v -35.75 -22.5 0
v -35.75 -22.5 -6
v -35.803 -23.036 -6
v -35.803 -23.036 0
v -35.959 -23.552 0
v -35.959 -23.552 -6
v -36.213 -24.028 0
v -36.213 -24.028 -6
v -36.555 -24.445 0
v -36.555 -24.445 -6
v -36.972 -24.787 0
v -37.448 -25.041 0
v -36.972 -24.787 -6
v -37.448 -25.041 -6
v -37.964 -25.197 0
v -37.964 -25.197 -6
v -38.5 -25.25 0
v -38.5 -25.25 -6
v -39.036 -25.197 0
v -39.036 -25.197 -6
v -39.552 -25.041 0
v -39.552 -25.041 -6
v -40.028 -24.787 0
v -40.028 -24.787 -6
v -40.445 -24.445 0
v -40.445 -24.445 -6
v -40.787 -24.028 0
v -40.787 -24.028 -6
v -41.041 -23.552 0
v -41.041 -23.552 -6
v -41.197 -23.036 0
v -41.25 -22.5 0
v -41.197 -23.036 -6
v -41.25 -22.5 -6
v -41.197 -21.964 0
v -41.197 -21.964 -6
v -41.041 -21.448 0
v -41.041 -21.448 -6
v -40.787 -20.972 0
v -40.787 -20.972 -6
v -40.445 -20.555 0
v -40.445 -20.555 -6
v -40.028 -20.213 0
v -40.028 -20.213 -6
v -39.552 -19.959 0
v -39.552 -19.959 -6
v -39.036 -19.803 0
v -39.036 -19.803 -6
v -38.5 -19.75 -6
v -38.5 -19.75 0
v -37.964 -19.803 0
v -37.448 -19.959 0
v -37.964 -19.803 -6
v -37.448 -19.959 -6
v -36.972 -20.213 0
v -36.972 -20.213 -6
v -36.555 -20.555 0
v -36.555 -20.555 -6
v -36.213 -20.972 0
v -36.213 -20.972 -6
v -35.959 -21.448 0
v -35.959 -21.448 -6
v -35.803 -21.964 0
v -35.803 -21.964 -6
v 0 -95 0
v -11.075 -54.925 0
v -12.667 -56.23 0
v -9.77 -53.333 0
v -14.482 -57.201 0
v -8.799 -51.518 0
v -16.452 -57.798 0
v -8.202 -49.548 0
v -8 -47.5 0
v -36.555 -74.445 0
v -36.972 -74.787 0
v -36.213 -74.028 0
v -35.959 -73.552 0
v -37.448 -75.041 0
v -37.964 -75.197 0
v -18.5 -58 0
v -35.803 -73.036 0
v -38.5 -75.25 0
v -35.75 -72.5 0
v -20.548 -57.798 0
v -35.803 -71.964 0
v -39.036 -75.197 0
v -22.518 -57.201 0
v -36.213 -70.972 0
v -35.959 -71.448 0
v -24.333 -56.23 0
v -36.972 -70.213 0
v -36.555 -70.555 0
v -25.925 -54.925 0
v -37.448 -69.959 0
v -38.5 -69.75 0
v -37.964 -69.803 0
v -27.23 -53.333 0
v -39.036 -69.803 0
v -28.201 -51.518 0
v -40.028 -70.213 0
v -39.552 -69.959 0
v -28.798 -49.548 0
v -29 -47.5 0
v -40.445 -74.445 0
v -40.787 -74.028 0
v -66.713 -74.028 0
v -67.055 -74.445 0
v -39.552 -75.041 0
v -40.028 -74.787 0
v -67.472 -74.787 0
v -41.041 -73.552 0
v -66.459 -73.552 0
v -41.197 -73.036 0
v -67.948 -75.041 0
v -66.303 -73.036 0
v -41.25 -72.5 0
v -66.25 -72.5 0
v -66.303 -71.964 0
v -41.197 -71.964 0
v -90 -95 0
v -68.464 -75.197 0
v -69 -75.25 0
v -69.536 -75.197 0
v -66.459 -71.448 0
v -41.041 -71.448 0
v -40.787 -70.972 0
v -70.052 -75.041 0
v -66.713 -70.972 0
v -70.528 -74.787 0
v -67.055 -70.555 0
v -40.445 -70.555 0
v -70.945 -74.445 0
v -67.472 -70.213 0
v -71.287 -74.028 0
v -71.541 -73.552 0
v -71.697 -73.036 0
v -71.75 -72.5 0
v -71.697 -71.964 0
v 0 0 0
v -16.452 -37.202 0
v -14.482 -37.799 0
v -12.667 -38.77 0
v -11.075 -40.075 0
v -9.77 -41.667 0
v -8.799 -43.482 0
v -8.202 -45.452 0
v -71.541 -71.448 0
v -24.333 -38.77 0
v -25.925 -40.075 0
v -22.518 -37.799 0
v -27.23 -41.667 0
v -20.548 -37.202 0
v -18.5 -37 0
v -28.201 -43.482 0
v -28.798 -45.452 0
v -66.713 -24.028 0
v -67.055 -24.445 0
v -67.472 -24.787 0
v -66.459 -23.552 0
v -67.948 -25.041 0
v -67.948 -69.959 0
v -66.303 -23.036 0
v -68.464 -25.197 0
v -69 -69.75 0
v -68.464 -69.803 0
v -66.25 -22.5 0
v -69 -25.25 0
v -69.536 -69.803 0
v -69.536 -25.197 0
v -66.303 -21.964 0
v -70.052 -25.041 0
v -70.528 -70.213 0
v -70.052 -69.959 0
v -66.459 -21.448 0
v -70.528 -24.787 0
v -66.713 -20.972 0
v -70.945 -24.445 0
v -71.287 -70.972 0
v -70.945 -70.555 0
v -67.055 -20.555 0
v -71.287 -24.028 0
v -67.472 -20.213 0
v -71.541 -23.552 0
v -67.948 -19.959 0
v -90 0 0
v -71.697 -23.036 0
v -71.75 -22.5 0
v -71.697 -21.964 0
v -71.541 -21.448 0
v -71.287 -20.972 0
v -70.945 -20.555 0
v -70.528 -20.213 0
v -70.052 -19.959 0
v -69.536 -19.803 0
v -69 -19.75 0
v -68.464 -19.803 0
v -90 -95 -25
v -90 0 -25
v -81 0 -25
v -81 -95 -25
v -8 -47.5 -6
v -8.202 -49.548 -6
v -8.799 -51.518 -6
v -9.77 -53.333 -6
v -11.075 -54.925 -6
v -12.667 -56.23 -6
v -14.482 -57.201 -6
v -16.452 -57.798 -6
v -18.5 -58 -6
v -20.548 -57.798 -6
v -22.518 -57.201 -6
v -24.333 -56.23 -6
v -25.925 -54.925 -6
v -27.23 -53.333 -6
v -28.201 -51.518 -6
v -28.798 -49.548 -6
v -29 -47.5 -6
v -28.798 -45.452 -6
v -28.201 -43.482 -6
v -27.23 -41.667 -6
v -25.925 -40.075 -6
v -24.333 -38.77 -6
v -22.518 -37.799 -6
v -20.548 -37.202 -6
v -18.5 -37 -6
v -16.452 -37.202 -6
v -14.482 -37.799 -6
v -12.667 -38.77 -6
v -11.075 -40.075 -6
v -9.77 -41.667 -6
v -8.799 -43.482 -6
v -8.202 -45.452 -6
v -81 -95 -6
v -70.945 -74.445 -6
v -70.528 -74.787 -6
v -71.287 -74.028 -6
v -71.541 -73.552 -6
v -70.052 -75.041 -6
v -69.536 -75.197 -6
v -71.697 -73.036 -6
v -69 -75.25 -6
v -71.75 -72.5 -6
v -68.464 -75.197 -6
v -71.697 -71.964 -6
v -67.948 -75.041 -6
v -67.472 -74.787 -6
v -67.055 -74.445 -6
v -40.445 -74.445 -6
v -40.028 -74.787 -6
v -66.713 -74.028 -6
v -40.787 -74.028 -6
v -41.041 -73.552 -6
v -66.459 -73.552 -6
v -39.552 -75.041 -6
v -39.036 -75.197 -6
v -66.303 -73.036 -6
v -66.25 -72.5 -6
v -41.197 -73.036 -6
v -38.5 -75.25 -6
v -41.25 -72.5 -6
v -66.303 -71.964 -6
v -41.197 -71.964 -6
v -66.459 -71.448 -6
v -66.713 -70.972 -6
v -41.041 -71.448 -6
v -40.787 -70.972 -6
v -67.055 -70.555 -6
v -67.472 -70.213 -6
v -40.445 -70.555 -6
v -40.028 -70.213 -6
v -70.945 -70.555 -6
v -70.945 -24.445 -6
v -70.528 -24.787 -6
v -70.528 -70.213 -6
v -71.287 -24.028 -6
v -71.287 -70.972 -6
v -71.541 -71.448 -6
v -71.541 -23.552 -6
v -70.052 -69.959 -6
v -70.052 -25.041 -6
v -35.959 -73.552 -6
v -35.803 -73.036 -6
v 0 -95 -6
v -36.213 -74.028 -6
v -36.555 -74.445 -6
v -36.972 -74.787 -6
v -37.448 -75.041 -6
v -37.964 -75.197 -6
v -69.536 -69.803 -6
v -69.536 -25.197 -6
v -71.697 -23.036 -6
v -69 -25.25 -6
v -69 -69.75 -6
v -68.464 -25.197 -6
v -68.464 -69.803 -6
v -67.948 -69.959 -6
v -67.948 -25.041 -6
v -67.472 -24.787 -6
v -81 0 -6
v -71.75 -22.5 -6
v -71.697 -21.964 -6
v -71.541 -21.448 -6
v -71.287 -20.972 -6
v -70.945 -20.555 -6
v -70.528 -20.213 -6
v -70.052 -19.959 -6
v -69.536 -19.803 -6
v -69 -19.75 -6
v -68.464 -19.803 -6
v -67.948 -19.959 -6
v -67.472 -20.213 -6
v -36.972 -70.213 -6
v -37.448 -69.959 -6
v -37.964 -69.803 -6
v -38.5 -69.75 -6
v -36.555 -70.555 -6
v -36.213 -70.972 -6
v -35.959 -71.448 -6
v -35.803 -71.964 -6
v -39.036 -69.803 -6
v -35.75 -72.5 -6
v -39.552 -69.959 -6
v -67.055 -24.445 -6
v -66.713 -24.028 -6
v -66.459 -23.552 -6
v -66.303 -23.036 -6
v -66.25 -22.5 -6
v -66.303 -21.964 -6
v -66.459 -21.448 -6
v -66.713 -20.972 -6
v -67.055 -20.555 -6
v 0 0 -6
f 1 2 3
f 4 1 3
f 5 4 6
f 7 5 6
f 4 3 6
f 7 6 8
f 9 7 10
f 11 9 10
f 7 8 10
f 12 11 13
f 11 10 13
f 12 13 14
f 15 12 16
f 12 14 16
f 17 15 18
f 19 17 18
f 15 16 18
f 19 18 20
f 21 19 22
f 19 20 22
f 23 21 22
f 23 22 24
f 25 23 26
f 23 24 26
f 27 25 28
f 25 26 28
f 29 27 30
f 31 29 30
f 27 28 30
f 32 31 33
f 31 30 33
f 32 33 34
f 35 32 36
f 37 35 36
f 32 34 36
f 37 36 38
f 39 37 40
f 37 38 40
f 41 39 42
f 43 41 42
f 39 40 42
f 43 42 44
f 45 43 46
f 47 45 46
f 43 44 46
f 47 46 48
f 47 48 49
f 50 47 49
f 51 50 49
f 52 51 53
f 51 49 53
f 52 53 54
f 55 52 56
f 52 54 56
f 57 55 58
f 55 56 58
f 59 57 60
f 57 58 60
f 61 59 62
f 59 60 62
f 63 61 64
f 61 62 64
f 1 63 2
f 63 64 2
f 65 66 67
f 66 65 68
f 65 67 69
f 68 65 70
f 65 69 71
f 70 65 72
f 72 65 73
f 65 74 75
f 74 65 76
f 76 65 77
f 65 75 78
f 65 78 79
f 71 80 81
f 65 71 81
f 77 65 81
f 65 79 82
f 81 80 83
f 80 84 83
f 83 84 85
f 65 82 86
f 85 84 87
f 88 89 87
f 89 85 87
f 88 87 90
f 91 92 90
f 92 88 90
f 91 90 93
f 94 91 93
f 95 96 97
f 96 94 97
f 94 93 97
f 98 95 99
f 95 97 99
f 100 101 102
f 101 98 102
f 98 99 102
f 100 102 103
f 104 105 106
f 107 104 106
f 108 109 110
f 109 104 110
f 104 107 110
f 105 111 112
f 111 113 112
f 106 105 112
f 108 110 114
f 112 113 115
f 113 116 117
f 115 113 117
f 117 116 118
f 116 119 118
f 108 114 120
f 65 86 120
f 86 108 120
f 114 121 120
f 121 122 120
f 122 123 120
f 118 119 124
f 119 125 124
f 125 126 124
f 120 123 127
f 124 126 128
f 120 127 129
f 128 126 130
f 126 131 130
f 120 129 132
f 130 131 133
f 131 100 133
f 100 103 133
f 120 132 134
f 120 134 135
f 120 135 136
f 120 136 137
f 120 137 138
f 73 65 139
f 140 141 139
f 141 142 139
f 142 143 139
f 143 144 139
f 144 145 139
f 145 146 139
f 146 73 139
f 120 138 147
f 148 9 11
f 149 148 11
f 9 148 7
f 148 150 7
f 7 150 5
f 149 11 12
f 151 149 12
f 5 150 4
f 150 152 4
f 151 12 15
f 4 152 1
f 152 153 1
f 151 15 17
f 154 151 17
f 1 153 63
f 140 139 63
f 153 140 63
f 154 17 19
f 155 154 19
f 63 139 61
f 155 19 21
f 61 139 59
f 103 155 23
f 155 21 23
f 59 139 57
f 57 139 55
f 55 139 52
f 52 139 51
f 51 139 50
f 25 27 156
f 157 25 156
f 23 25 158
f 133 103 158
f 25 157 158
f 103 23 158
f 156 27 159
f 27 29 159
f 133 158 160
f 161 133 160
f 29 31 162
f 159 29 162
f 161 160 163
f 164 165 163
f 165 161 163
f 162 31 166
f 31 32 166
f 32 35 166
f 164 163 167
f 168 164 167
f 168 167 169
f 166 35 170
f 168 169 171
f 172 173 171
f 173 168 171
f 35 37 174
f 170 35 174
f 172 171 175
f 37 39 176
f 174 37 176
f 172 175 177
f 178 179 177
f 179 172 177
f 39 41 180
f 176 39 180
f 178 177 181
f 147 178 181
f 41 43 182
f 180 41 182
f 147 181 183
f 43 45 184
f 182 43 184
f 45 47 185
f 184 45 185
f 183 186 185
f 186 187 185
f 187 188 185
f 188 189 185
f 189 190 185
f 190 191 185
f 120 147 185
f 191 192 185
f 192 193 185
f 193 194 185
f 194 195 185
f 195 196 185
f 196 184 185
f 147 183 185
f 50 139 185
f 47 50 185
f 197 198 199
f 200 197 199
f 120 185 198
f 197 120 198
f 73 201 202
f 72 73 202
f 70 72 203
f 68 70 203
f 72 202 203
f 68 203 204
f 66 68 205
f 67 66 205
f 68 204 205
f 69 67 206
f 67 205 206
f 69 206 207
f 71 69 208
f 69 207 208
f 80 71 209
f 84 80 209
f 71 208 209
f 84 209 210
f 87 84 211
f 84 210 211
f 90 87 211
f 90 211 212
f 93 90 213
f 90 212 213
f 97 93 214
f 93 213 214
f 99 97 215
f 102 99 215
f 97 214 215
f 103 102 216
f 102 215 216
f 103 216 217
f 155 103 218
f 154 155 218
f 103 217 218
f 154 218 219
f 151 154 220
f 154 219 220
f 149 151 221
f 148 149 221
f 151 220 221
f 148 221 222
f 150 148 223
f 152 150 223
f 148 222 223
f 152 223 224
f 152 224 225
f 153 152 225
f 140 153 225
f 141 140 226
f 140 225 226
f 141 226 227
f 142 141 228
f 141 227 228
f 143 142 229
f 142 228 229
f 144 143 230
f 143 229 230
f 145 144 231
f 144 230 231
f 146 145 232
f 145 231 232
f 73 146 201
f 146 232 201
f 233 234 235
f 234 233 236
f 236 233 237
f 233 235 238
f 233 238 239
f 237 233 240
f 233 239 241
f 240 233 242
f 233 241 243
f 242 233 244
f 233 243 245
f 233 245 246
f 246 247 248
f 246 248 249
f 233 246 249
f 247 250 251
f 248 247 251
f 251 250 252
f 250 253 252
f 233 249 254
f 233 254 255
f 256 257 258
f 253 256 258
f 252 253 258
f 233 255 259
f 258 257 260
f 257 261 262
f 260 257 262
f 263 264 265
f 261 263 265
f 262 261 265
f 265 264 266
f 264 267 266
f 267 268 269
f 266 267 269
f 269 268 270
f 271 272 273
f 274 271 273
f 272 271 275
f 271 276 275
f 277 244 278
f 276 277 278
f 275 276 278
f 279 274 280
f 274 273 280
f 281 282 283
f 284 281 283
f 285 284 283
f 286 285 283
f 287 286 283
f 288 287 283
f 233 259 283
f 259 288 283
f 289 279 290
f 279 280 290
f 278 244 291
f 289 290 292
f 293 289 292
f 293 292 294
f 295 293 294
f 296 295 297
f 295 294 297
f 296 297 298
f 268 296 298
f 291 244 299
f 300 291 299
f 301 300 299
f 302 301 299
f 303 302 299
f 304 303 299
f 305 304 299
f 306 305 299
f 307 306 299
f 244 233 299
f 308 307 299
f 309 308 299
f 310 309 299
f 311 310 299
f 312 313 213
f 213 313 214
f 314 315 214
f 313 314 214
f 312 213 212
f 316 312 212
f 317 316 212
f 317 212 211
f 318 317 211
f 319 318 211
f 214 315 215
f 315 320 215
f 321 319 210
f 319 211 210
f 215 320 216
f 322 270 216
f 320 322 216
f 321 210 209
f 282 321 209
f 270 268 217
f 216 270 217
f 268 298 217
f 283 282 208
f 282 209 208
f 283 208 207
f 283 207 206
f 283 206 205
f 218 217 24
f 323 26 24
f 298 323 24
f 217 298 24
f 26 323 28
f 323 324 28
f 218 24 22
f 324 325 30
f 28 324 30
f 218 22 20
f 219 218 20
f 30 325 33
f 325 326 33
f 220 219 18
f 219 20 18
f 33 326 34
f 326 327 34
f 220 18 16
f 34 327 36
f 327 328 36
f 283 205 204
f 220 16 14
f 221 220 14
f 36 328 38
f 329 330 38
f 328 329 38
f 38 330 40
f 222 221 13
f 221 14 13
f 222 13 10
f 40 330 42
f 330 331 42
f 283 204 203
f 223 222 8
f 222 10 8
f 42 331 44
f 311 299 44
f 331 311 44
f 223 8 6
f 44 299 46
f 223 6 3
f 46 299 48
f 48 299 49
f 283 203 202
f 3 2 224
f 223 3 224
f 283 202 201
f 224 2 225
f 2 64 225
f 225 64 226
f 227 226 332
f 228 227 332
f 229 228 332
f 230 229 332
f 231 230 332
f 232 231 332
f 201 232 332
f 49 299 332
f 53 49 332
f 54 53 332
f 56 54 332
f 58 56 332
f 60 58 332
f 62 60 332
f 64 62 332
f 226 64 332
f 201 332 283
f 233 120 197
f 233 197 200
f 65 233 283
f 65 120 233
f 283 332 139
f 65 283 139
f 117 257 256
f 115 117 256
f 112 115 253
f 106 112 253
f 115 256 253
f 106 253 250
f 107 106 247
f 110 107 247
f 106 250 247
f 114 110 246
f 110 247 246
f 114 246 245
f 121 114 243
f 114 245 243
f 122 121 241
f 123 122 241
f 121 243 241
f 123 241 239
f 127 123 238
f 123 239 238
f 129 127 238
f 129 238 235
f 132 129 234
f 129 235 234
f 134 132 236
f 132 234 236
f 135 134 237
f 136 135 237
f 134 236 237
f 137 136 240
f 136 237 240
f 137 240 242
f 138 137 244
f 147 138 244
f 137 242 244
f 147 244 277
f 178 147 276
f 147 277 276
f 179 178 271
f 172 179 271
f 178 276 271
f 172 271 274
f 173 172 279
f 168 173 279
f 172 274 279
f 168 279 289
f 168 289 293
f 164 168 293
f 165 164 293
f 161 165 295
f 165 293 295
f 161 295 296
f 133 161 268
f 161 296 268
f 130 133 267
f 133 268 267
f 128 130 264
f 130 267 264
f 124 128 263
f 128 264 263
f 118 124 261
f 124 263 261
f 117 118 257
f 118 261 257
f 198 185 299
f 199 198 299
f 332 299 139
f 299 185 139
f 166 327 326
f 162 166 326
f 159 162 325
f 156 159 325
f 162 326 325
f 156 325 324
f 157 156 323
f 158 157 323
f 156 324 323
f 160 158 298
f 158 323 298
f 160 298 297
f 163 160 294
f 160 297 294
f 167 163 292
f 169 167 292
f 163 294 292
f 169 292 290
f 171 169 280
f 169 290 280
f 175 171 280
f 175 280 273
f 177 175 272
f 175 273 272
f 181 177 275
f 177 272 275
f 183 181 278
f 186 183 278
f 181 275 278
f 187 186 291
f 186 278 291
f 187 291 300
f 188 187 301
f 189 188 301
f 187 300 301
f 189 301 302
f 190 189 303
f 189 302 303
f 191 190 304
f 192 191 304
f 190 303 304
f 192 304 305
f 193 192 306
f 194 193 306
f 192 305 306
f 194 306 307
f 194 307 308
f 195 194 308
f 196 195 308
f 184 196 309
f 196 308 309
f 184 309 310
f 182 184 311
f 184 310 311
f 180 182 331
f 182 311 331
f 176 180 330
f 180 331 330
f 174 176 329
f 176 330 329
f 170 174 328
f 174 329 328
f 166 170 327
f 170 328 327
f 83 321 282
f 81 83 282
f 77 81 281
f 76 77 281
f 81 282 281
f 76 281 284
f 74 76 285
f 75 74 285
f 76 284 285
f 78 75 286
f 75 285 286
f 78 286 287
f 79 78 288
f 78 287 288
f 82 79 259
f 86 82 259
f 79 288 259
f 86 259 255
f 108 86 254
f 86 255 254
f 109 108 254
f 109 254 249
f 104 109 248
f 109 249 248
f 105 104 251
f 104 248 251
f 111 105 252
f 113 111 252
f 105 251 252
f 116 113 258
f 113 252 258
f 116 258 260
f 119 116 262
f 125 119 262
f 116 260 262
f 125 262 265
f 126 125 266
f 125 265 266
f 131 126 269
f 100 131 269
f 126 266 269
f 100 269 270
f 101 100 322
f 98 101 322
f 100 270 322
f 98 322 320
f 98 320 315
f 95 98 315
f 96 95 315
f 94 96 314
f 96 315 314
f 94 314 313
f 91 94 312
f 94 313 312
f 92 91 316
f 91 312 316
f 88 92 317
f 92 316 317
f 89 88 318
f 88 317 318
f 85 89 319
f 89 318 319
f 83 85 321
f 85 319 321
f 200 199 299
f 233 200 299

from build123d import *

# Parameters (mm, degrees)
F1_DEPTH = 95
F2_R     = 2.75
F2_R_2   = 10.5
F3_DEPTH = 6


with BuildPart() as f1:
    # F0 (on Front) → F1 (new body)
    with BuildSketch(Plane.XZ):
        Polygon((0, -6), (0, 0), (-90, 0), (-90, -25), (-81, -25), (-81, -6), align=None)
    extrude(amount=F1_DEPTH)

    # F2 (on face) → F3 (cut)
    with BuildSketch(Plane(origin=(0, 0, -6), x_dir=(1, 0, 0), z_dir=(0, 0, -1))):
        with Locations((-69, 72.5)):
            Circle(F2_R)
        with Locations((-38.5, 72.5)):
            Circle(F2_R)
        with Locations((-69, 22.5)):
            Circle(F2_R)
        with Locations((-38.5, 22.5)):
            Circle(F2_R)
        with Locations((-18.5, 47.5)):
            Circle(F2_R_2)
    extrude(amount=-F3_DEPTH, mode=Mode.SUBTRACT)


solid = f1.part
